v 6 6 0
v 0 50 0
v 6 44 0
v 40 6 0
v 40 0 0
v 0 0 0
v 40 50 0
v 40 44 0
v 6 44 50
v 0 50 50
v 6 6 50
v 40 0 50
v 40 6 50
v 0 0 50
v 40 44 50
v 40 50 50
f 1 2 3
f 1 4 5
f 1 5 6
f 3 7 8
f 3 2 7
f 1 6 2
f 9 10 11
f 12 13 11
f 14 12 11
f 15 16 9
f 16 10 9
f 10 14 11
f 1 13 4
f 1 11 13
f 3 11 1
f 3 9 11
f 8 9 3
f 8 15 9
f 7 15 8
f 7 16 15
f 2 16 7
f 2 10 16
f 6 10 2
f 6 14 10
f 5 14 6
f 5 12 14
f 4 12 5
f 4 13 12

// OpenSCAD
$fn = 32;

// ----------------------------------------------------------------------
// Structural section: channel 40 x 50 mm
// ----------------------------------------------------------------------

// --- parameters (mm) ---
sec_w = 40;               // channel width, X
sec_h = 50;               // channel height, Y
flange_t = 6;             // flange thickness
web_t = 6;                // web thickness
plate_t = 50;             // cut length, Z (extrusion height)

profile = [[0, 0], [40, 0], [40, 6], [6, 6], [6, 44], [40, 44], [40, 50], [0, 50]];  // primary outline, 8 points, counter clockwise

// --- the one profile operation ---
linear_extrude(height = plate_t) polygon(points = profile);
